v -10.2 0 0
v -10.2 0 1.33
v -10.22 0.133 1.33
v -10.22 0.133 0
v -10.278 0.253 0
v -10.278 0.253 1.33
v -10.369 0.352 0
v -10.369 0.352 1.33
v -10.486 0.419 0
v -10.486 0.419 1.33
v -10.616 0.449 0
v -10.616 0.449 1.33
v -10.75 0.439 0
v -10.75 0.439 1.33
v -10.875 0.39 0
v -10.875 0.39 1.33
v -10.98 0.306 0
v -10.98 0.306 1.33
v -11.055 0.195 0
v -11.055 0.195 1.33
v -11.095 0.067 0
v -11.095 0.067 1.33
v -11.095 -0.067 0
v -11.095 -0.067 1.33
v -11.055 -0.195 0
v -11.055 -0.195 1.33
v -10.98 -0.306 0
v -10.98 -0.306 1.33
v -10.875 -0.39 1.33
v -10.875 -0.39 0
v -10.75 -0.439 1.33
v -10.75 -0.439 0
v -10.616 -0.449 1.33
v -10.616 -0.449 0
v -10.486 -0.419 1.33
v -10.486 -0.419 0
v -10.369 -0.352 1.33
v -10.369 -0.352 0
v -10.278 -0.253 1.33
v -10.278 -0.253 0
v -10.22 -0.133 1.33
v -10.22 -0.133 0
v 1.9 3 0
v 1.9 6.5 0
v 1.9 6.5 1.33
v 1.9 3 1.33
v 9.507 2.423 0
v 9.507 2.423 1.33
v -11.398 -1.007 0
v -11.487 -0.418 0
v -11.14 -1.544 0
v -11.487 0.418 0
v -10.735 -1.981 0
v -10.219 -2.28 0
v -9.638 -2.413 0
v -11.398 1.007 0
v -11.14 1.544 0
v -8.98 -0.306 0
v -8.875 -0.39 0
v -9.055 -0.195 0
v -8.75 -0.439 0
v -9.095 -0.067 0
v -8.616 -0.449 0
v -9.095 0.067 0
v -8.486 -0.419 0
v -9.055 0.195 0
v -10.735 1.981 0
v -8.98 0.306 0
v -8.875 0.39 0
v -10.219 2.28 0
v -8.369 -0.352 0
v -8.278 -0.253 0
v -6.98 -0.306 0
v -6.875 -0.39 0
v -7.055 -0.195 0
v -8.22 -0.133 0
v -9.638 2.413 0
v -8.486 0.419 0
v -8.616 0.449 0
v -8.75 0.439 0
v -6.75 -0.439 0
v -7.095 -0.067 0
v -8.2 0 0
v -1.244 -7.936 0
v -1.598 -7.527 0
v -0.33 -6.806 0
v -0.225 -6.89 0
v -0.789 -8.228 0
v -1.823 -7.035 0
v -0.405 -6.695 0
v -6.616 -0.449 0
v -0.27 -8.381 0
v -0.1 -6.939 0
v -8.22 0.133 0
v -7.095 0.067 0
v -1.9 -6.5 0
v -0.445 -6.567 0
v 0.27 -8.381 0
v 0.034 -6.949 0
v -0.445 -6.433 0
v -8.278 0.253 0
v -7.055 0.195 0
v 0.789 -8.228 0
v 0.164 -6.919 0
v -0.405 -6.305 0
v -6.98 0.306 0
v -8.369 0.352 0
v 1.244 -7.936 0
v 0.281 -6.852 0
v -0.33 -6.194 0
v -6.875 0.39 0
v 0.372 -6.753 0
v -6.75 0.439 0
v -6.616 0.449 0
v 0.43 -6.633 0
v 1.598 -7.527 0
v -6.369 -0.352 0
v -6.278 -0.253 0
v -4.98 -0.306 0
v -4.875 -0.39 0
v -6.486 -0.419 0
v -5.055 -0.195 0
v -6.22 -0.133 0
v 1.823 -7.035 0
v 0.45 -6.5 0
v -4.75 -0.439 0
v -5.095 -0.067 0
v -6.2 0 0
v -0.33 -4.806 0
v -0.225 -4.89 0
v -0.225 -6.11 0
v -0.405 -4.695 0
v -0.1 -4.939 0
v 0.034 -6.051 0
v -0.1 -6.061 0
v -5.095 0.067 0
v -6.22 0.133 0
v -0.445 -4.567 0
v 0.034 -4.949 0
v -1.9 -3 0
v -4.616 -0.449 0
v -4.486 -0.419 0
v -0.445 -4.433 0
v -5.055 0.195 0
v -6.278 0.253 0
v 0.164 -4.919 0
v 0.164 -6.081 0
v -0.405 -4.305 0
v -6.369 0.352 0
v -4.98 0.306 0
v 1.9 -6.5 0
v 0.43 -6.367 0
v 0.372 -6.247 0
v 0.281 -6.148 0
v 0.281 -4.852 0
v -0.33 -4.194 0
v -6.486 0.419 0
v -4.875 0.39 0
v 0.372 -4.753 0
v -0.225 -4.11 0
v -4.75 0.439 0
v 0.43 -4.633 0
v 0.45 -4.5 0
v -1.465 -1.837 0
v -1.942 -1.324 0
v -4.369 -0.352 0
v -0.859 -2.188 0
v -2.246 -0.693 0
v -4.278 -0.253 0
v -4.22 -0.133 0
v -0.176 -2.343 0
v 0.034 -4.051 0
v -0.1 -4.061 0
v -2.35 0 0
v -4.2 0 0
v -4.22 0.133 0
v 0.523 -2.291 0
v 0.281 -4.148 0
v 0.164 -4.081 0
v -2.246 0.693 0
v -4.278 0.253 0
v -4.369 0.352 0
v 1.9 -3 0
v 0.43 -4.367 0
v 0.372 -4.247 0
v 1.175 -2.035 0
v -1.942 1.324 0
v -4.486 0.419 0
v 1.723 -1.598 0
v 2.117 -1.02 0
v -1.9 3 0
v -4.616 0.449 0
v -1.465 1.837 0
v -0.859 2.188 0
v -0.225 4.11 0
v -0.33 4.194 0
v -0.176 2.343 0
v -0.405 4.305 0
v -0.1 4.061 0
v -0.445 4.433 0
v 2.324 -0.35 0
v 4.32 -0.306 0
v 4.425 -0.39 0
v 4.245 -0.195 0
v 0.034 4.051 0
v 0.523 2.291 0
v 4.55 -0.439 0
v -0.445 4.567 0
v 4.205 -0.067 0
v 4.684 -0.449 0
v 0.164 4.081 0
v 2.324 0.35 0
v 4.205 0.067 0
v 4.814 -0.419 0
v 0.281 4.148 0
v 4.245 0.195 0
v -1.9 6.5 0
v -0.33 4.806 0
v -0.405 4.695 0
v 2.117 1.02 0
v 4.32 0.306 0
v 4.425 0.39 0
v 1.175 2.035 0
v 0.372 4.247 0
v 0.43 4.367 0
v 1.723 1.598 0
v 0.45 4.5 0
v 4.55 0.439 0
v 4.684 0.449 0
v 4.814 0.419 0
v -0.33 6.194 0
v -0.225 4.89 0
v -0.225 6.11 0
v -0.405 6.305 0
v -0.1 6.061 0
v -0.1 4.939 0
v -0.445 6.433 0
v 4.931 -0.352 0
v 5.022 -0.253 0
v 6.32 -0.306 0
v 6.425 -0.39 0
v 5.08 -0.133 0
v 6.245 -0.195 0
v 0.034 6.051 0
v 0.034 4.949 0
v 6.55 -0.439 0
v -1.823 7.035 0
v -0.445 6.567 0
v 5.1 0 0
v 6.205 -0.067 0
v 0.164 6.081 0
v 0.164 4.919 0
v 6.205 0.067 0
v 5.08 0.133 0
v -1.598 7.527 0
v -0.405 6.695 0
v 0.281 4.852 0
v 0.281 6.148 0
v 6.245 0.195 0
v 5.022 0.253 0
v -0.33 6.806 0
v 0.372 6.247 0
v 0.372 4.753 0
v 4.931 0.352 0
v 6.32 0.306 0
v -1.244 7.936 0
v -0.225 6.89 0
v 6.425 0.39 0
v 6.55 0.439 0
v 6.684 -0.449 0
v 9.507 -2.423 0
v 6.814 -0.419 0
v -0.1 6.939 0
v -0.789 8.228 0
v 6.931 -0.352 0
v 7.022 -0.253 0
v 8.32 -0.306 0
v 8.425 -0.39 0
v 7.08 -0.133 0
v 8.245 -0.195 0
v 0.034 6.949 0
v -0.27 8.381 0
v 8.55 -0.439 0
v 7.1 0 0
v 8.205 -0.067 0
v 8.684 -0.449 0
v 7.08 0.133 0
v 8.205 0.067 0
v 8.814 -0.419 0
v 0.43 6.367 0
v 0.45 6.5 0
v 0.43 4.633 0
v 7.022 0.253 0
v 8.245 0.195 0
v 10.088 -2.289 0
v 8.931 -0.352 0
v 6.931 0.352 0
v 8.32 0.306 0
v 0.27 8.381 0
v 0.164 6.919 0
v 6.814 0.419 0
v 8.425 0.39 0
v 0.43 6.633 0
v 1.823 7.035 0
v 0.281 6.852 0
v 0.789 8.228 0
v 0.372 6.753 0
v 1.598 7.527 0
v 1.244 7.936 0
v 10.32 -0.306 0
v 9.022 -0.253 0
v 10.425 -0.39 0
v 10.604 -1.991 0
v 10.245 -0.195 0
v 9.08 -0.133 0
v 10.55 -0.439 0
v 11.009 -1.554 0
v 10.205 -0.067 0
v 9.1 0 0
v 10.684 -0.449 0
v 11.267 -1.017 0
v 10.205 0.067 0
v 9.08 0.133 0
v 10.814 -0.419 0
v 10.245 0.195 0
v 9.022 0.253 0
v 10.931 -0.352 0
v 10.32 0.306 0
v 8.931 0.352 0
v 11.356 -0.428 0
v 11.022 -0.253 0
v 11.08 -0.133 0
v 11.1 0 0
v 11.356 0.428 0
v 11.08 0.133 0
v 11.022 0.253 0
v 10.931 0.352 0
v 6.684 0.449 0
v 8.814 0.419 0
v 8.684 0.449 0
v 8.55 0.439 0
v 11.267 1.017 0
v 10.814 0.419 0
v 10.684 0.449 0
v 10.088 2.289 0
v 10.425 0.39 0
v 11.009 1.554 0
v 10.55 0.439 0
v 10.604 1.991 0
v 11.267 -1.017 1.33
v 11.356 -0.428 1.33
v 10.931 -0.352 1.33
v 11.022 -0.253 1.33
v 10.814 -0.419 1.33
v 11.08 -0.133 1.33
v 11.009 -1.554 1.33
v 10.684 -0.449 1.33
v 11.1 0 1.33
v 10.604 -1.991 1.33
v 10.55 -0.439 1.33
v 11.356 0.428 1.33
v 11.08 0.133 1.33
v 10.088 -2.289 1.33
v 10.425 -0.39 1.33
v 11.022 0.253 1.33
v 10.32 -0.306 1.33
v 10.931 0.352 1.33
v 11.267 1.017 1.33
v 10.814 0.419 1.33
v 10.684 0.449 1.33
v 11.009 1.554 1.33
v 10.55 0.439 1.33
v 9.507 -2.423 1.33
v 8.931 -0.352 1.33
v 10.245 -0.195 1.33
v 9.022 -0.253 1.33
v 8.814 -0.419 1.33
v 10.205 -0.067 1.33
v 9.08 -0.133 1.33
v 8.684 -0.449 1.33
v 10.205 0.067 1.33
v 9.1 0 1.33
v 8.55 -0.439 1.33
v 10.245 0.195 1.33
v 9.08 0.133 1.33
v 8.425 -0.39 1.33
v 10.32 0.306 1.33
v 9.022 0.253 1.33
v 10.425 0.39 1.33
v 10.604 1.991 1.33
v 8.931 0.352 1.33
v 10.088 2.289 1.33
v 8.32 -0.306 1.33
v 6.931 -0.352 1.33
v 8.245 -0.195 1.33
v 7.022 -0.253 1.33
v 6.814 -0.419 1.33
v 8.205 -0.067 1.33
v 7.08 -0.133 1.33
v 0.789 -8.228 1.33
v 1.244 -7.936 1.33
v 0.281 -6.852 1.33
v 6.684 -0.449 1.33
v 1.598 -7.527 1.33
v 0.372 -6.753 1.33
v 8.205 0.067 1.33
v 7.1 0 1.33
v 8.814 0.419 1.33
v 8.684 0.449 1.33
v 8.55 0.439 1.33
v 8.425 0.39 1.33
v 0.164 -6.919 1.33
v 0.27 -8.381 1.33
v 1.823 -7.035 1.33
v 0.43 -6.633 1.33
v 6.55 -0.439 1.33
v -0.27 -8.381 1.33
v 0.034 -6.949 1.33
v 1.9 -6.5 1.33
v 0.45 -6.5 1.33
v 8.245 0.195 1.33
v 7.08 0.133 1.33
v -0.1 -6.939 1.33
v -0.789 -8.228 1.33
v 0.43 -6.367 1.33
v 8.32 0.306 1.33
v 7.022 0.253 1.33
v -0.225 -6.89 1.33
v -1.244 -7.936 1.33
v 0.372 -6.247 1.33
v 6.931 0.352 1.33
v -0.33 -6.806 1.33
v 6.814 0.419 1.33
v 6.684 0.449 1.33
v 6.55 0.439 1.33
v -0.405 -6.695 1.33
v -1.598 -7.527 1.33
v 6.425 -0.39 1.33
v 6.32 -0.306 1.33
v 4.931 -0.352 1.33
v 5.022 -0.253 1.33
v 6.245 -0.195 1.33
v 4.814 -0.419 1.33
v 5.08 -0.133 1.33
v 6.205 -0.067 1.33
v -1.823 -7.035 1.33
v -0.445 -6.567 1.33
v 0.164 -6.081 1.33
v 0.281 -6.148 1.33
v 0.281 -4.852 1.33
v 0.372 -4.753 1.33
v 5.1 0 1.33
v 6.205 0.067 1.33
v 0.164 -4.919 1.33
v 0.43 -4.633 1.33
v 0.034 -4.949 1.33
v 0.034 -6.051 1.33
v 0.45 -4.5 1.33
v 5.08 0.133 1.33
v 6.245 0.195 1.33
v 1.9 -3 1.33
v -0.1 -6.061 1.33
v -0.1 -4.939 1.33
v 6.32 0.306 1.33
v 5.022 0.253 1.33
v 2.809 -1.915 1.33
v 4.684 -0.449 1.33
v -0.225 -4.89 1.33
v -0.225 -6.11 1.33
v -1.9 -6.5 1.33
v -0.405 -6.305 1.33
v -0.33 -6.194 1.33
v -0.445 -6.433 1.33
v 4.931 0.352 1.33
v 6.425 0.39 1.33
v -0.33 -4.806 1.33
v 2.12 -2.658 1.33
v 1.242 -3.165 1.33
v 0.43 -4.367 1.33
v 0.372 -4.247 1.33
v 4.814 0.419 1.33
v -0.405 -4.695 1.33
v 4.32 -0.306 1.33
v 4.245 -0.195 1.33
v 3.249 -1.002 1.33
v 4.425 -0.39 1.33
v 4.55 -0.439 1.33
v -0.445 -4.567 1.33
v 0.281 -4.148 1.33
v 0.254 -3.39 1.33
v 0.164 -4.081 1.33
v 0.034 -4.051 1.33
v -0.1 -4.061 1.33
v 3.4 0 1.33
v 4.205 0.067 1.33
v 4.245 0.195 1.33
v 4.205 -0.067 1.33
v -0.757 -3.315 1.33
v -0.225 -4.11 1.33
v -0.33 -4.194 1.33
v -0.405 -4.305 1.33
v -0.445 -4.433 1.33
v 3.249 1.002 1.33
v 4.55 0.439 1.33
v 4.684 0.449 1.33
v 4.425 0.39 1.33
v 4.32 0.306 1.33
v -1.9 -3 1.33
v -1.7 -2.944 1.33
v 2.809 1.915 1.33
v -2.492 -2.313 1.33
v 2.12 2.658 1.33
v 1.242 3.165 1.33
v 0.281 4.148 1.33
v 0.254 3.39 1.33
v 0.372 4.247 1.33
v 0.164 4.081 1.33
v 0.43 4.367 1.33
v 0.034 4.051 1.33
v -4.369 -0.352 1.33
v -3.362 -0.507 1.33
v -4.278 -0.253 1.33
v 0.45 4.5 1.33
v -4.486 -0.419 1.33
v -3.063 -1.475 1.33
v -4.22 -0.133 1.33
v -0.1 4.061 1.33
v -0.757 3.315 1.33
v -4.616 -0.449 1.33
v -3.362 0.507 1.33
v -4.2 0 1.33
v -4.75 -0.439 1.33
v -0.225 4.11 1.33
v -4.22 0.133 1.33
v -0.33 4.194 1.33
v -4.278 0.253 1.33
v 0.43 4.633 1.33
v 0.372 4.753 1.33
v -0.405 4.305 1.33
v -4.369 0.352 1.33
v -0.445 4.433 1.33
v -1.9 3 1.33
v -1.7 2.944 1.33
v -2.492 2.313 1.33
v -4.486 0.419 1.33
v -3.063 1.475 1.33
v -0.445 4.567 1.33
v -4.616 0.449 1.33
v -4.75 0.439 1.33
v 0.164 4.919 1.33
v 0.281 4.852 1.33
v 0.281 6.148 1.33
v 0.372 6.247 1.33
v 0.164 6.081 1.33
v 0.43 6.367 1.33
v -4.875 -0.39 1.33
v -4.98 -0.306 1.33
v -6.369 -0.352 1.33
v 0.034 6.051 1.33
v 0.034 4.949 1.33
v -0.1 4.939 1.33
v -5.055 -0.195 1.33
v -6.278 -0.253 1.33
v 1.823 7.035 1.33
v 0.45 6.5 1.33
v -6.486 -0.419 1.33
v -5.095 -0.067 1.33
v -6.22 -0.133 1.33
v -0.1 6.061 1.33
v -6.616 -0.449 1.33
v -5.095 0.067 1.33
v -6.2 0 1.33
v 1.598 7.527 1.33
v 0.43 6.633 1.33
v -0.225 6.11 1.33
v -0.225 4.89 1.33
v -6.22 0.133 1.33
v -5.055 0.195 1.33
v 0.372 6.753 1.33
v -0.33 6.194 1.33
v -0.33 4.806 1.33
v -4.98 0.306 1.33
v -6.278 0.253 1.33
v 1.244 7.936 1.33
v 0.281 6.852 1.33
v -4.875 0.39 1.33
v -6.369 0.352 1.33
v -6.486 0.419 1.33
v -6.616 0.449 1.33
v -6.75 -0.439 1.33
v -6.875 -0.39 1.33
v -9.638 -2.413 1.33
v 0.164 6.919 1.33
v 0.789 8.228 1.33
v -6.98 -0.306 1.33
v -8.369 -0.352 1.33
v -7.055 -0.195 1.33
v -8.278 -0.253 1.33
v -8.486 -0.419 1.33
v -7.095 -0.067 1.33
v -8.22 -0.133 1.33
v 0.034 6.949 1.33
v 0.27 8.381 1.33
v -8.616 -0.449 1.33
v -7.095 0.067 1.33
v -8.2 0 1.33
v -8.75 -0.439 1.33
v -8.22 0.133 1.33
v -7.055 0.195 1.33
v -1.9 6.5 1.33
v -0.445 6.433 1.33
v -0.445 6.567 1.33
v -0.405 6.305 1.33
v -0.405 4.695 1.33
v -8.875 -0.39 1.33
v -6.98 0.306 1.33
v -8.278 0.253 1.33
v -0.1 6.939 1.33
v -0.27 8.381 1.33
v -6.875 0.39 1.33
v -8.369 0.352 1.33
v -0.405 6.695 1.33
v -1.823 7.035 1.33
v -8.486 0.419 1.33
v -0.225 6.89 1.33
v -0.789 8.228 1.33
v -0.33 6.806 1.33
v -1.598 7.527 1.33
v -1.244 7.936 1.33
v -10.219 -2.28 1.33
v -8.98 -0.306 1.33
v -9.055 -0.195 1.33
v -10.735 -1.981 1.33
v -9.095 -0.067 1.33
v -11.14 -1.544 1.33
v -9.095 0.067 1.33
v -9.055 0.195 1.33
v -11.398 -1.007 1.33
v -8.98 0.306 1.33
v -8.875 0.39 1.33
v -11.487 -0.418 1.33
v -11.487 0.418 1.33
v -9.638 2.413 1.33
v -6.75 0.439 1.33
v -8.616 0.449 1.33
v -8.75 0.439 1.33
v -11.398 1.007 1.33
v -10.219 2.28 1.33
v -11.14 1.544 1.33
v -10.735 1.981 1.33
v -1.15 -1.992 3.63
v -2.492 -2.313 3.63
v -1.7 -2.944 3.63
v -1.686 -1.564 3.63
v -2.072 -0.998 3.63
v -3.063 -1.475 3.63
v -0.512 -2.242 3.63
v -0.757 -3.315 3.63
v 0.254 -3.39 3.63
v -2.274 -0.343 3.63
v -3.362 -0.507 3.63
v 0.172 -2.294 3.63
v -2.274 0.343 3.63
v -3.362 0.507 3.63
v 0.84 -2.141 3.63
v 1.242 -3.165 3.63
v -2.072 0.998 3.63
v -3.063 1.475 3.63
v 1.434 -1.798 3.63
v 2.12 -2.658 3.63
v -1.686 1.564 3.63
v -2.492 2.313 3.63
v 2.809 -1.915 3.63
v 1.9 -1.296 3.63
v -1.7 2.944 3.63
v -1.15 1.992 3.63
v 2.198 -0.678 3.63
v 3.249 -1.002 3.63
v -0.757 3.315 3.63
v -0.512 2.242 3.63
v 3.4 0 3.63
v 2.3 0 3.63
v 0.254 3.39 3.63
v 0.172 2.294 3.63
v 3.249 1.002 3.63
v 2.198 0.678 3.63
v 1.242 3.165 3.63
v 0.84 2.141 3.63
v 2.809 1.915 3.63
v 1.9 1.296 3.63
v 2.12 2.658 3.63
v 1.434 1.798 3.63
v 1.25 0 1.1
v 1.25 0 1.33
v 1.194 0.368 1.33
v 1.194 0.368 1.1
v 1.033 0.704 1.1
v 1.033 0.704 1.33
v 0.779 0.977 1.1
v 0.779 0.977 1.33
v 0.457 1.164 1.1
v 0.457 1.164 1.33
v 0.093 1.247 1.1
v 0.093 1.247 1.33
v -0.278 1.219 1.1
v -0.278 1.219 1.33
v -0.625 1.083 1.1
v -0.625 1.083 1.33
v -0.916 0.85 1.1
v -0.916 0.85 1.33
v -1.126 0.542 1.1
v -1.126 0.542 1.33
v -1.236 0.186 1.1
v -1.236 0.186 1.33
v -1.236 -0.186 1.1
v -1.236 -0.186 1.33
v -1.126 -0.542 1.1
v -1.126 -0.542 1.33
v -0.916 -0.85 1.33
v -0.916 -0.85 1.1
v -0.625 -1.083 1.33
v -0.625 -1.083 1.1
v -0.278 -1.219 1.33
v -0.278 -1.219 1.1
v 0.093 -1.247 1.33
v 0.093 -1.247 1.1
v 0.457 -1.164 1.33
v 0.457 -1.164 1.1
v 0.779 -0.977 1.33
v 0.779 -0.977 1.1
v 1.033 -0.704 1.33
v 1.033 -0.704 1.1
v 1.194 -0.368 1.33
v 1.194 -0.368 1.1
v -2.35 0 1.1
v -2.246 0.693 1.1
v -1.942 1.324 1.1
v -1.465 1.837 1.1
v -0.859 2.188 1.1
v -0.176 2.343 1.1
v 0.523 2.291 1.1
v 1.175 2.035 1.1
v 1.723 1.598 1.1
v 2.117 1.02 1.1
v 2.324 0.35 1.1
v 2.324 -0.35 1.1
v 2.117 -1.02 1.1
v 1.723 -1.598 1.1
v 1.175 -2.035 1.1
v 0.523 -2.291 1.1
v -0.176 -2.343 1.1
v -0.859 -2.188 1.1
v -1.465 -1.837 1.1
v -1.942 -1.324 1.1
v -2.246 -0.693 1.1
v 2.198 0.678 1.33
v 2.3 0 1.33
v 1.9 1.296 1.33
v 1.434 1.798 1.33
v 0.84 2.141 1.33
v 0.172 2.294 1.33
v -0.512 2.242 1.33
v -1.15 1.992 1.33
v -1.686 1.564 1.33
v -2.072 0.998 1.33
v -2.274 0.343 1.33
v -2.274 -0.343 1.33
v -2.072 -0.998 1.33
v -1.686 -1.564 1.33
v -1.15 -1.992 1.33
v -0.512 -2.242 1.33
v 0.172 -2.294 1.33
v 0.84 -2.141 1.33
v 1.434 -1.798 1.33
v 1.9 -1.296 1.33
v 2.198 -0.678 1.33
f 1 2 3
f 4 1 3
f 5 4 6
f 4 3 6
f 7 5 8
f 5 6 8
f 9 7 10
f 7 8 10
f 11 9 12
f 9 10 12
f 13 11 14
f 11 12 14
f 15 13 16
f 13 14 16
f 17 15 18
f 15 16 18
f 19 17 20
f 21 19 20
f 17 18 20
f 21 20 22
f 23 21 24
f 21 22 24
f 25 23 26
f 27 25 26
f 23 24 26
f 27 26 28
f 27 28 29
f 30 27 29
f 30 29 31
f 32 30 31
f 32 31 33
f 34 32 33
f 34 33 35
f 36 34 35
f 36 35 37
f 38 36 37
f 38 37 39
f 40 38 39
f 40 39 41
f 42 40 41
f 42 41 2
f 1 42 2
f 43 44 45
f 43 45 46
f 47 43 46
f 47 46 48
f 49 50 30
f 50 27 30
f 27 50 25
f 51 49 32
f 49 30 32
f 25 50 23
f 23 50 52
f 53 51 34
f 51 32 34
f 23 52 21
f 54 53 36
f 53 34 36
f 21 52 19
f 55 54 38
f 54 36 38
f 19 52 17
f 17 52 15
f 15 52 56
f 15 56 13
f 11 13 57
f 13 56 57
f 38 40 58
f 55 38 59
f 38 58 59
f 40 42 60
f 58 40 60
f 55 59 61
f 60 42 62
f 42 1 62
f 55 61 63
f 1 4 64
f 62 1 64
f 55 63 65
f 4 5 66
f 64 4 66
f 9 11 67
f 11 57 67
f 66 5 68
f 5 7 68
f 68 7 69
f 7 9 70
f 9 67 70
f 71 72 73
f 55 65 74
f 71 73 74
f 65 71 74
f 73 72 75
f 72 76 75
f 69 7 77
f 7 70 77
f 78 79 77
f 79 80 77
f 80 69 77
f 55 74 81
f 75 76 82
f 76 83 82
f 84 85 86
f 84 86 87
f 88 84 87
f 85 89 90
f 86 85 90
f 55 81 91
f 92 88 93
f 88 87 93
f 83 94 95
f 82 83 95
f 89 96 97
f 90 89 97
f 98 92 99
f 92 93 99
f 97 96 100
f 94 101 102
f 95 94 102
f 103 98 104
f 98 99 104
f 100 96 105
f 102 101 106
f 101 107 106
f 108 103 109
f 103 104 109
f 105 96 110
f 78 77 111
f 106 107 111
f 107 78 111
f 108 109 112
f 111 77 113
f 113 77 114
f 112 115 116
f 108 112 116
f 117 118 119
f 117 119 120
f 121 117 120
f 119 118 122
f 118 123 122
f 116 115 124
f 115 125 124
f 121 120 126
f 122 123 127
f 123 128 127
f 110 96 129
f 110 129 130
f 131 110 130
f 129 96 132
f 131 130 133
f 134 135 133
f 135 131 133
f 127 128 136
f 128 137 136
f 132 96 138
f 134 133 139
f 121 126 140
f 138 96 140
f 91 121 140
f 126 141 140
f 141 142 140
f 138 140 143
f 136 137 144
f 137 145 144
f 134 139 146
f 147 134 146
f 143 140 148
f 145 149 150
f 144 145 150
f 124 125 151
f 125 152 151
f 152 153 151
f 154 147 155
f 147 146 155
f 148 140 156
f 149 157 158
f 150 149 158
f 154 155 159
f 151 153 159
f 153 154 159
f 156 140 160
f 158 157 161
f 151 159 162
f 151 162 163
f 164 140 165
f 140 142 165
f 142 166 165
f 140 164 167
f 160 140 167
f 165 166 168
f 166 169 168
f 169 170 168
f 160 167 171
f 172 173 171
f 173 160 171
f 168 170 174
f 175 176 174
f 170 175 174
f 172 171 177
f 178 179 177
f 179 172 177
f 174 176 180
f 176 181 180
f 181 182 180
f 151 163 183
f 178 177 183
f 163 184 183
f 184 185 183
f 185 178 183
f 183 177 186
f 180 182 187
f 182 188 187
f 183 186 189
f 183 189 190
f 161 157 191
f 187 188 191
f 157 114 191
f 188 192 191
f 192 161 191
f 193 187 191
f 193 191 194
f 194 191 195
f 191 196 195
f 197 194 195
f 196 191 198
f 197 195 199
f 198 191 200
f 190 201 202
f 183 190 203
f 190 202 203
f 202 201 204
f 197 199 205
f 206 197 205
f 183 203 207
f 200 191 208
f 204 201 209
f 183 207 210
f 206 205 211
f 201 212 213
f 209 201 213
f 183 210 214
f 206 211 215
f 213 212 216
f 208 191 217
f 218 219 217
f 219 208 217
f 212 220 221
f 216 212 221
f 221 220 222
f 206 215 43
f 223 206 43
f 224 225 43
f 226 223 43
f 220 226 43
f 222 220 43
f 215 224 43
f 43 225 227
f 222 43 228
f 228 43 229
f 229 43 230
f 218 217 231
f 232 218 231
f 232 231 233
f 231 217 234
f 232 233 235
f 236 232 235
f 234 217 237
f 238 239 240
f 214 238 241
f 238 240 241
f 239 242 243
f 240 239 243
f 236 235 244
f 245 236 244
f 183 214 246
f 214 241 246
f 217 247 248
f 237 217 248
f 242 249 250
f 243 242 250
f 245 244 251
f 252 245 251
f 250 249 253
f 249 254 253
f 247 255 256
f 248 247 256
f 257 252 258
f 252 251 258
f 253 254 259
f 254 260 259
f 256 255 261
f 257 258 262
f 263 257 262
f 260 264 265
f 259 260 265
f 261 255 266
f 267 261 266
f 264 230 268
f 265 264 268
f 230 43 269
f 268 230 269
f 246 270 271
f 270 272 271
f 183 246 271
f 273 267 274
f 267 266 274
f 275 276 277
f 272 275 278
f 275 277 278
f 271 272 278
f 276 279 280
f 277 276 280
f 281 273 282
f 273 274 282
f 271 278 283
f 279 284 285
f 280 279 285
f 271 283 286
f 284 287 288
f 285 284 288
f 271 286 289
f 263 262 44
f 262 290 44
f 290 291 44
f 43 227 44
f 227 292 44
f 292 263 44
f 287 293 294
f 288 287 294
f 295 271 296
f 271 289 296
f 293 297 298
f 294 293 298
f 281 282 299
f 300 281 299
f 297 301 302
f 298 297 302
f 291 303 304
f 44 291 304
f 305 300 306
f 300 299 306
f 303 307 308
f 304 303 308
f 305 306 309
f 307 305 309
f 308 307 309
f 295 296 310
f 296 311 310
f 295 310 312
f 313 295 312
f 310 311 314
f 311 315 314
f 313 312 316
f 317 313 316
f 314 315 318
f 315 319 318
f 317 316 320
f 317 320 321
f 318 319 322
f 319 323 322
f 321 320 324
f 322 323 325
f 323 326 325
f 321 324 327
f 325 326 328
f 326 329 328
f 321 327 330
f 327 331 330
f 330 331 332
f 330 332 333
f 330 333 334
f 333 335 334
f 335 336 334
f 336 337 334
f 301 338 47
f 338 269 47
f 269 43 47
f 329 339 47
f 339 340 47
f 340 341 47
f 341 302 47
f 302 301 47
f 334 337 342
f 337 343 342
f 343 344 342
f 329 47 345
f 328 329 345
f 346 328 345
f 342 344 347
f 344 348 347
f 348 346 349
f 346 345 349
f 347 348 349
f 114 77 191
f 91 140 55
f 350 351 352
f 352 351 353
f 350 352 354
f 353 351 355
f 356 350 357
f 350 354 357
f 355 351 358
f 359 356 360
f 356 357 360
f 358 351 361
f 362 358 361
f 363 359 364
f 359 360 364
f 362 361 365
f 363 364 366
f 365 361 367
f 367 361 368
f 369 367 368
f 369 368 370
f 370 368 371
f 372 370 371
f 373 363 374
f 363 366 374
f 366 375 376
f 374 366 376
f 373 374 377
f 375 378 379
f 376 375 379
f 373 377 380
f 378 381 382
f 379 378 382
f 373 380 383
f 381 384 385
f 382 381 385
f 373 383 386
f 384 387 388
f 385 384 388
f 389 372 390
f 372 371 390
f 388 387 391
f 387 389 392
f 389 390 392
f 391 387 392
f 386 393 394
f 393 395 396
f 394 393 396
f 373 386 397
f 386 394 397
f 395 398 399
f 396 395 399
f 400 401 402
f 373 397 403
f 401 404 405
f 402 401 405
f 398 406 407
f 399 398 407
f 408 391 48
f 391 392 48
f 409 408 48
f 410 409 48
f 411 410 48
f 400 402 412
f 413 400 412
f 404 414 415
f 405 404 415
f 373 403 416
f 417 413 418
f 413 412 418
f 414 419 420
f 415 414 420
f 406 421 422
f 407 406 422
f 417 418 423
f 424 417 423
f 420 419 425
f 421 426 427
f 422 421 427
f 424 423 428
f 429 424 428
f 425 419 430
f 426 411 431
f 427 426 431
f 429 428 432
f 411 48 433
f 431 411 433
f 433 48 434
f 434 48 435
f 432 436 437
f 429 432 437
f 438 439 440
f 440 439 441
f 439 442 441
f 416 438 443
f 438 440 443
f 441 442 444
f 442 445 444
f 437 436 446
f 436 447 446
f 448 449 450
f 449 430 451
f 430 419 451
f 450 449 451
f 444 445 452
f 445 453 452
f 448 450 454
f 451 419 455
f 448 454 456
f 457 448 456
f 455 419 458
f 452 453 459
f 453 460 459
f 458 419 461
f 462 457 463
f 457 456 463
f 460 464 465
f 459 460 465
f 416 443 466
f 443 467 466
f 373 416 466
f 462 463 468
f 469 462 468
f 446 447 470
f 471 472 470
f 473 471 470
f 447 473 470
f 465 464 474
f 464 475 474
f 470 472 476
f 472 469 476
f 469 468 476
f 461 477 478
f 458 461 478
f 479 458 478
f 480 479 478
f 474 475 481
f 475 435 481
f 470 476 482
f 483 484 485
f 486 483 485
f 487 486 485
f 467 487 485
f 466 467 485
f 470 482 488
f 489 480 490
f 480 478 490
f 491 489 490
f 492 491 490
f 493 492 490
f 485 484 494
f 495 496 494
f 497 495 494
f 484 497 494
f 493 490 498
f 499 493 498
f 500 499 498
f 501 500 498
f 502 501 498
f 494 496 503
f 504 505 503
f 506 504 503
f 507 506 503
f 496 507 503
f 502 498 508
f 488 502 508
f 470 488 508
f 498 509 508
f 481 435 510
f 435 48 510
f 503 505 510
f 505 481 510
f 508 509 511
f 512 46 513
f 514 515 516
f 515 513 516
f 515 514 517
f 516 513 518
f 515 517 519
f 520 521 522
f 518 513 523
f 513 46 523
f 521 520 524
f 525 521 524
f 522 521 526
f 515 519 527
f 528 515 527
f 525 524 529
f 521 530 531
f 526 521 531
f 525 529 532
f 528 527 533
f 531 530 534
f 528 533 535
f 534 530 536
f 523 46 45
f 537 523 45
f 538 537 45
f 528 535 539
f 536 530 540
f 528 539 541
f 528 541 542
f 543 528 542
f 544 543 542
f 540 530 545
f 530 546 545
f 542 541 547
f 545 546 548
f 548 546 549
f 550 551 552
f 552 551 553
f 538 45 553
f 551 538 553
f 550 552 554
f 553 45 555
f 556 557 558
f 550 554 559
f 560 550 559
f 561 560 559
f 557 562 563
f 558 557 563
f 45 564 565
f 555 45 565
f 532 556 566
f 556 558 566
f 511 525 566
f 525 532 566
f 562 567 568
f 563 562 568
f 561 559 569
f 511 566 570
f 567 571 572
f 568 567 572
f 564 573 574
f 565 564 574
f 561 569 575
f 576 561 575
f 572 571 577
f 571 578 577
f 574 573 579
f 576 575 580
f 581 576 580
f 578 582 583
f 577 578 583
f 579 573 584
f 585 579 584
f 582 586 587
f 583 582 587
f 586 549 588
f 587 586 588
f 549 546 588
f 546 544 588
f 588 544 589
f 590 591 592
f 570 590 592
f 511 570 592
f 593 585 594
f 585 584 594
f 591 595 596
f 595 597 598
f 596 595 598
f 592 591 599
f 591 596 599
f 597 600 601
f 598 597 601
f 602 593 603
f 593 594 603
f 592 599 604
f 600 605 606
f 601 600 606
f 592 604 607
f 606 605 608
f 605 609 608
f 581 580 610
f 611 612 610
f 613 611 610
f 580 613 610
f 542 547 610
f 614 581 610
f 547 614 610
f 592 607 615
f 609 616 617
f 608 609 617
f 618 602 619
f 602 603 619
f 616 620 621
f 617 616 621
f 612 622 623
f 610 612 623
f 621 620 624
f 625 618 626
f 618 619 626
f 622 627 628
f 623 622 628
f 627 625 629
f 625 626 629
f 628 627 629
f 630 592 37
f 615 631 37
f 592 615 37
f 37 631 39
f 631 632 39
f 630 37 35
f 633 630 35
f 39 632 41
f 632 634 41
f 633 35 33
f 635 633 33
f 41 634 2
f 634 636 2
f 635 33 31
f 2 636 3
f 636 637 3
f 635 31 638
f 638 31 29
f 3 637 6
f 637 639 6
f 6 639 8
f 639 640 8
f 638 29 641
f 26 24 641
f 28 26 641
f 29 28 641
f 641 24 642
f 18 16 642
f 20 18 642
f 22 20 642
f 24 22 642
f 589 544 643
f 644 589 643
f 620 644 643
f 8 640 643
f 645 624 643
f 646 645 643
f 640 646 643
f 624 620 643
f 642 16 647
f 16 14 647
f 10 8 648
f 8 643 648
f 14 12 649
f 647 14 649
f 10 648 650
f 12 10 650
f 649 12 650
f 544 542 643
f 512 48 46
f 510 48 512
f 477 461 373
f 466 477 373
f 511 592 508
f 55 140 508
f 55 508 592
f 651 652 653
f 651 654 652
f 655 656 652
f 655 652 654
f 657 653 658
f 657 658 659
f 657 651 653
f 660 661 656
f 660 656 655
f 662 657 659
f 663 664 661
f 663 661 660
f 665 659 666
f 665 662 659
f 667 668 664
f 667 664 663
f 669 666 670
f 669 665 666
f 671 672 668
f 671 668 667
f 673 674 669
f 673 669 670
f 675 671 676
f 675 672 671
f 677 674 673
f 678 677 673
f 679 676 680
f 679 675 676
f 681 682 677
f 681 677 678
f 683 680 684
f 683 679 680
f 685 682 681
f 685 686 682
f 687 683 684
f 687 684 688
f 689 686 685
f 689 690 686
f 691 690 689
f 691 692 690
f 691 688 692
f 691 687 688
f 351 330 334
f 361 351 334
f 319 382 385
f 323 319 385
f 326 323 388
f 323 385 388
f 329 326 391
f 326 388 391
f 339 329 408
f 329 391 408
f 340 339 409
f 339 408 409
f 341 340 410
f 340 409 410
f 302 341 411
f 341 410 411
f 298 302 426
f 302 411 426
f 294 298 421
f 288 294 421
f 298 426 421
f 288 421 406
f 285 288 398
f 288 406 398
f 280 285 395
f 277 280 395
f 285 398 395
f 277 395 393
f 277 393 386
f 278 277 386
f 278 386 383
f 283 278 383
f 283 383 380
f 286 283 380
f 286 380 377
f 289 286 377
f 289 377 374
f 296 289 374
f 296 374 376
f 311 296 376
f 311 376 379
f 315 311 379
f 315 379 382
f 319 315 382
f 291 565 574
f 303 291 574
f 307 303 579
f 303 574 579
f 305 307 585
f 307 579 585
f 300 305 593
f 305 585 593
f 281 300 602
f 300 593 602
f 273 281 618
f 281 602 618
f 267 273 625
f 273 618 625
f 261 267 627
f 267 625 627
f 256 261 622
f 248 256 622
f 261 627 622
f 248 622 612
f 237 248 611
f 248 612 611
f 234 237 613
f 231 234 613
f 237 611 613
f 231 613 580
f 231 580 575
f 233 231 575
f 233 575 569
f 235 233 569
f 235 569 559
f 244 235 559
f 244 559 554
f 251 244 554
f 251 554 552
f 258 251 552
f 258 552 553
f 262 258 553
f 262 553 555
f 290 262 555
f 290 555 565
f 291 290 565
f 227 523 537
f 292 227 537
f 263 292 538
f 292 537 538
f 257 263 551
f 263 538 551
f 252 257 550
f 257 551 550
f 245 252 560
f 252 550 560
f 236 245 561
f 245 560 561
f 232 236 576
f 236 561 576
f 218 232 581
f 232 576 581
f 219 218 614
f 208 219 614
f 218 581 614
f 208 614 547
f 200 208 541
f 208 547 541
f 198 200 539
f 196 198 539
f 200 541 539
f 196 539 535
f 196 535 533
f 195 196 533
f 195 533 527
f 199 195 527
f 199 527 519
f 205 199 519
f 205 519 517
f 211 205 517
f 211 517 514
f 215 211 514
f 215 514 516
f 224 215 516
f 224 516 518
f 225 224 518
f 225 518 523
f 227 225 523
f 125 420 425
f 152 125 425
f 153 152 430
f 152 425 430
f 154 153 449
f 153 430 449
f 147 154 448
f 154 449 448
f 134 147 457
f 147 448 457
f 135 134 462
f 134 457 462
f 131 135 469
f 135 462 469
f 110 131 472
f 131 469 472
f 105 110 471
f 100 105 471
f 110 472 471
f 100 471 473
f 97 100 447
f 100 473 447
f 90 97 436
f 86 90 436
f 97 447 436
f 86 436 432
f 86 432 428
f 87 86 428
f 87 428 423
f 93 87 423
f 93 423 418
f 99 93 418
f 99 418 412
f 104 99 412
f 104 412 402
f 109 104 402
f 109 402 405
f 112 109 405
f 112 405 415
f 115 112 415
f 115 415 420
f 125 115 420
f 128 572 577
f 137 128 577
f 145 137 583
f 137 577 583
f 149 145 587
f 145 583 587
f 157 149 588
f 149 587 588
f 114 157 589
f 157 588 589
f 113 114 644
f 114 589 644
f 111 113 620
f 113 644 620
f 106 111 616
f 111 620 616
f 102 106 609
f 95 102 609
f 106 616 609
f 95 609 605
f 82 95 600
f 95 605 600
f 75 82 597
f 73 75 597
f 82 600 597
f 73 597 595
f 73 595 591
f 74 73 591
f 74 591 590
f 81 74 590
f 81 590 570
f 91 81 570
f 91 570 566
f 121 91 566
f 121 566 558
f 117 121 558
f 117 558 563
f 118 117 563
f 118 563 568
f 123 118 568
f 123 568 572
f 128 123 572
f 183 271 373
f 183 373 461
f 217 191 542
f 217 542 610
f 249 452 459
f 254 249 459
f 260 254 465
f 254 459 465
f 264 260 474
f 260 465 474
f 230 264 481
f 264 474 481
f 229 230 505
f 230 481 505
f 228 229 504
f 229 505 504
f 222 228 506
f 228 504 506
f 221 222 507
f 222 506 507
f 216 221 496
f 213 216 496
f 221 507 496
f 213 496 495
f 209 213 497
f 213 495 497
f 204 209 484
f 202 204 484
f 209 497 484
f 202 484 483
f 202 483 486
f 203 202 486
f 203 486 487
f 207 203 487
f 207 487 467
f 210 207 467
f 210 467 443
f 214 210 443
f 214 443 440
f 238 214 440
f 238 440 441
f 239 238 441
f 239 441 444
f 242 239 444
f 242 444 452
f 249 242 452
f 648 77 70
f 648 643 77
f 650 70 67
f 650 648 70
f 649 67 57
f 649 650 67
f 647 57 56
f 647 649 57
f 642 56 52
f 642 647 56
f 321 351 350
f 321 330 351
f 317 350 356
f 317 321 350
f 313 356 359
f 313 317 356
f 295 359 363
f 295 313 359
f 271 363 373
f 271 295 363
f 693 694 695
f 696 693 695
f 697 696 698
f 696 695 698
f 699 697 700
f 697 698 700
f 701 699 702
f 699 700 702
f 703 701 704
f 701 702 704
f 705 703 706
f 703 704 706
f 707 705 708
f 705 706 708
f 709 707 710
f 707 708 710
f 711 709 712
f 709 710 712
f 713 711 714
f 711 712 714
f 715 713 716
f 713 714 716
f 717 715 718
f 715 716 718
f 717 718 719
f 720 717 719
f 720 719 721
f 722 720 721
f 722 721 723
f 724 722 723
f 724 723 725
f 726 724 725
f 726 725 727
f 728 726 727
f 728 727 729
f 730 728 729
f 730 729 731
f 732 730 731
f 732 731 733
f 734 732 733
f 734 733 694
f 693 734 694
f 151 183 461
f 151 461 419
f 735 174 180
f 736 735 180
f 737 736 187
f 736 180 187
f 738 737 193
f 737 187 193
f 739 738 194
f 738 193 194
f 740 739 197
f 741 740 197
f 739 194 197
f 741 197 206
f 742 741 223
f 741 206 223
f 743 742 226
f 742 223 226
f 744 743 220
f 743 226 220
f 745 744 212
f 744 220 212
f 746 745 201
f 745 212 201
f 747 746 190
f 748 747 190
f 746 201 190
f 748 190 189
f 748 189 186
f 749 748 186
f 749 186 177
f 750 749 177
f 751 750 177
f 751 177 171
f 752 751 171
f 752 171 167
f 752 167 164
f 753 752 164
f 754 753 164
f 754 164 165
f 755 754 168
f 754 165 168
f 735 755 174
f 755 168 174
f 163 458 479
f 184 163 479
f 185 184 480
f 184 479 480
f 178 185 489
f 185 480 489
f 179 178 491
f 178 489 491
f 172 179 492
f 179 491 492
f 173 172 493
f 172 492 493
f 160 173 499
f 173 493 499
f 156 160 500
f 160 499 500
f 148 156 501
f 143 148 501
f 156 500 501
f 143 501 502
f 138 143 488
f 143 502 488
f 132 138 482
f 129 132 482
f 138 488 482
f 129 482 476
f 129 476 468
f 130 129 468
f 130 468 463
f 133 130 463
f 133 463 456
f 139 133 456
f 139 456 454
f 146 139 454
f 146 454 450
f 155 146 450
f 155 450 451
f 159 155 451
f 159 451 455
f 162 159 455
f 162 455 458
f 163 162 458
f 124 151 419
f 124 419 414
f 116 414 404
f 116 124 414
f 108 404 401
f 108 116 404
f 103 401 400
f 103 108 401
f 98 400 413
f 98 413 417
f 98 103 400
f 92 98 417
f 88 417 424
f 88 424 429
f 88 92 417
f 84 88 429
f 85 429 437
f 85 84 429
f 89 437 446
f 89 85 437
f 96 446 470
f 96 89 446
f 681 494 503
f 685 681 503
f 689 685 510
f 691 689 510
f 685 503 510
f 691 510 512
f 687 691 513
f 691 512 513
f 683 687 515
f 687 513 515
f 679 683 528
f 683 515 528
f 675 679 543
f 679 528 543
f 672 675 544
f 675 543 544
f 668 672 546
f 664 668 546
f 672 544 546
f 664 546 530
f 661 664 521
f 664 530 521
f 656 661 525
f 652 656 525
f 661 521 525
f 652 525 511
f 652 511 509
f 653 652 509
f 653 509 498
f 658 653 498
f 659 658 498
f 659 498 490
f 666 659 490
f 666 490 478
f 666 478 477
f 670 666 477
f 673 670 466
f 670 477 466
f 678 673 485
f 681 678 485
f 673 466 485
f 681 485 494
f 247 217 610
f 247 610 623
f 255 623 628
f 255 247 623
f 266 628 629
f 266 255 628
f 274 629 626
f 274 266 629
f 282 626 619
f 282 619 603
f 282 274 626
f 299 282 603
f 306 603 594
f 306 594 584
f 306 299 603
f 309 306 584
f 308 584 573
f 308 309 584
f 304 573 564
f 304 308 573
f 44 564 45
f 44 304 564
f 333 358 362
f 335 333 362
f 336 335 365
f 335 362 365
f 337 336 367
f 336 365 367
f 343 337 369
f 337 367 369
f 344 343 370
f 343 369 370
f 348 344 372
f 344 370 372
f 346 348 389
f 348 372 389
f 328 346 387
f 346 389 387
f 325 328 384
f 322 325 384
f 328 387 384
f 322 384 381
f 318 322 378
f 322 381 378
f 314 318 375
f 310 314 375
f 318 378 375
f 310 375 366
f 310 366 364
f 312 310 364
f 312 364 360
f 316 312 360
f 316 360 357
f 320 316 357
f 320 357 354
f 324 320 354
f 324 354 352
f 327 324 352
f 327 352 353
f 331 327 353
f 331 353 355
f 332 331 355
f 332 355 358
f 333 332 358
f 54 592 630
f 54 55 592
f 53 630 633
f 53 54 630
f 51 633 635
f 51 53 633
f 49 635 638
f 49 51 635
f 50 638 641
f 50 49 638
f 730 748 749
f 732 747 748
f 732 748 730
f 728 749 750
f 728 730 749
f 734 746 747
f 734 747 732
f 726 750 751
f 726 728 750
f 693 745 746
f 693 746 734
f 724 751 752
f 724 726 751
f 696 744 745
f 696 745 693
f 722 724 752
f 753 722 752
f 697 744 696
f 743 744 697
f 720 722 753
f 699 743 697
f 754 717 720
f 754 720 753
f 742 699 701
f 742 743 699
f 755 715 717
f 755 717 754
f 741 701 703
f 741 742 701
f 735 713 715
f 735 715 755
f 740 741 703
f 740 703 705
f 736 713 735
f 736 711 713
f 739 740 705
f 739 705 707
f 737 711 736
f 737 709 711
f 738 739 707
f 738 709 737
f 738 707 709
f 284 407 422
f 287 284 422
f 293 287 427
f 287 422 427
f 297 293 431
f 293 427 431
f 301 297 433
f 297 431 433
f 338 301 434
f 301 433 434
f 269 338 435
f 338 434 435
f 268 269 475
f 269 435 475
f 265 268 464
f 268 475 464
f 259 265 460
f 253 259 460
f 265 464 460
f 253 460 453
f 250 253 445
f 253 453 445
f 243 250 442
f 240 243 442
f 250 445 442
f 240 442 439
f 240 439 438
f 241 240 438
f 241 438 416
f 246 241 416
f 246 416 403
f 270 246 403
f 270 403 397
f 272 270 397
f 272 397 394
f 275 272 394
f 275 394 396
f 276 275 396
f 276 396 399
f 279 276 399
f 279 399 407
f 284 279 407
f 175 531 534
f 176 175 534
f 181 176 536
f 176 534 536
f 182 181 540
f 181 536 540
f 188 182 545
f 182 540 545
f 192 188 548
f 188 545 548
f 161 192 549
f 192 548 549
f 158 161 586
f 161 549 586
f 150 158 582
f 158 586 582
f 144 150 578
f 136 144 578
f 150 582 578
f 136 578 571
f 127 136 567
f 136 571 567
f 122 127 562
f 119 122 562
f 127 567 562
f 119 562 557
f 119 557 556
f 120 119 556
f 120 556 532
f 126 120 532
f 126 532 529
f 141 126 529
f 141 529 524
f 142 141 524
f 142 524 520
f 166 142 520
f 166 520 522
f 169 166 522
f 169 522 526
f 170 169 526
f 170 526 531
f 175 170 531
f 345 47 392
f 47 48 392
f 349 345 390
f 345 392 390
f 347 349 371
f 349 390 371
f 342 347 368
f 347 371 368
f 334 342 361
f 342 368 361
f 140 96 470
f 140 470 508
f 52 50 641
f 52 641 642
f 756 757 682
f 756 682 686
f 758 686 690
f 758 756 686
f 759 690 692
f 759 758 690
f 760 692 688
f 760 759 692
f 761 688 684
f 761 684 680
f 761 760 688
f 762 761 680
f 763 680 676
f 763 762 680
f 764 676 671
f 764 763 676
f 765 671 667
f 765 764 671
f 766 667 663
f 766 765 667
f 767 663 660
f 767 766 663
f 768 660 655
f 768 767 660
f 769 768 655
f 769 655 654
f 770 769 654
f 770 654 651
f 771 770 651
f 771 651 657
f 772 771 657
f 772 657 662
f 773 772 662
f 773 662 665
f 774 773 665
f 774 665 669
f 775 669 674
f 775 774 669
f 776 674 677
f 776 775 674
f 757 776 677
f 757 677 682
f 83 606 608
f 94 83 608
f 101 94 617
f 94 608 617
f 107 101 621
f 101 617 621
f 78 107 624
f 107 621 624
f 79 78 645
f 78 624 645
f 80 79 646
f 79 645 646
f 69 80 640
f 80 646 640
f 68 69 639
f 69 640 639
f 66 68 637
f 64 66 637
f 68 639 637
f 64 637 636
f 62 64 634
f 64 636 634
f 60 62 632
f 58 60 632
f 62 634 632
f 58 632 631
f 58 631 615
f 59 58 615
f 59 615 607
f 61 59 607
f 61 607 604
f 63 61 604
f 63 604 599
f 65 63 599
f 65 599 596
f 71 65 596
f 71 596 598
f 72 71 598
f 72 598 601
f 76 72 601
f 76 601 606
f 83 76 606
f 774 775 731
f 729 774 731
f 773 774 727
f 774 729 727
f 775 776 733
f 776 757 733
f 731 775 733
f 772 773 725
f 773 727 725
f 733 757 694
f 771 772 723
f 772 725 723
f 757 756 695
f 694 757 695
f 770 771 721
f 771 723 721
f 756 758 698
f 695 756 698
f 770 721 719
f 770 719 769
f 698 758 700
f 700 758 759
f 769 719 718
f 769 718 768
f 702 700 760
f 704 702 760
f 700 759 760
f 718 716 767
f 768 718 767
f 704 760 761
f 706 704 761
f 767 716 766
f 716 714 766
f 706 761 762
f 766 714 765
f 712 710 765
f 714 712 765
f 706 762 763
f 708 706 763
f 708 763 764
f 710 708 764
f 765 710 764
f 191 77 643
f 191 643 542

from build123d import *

# Parameters (mm, degrees)
AUFSATZ_LINEAR_AUSTRAGEN1_DEPTH      = 1.33
SKIZZE2_R                            = 3.4
SKIZZE2_R_2                          = 2.3
AUFSATZ_LINEAR_AUSTRAGEN2_DEPTH      = 2.3
AUFSATZ_LINEAR_AUSTRAGEN2_DEPTH_BACK = 1.33
SKIZZE3_R                            = 1.25
SCHNITT_LINEAR_AUSTRAGEN1_DEPTH      = 2.33
SKIZZE4_R                            = 2.35
SCHNITT_LINEAR_AUSTRAGEN2_DEPTH      = 1.1
SKIZZE5_R                            = 0.45
SCHNITT_LINEAR_AUSTRAGEN3_DEPTH      = 2.33
SKIZZE7_W                            = 8.843573308
SKIZZE7_H                            = 7.939116947
SKIZZE7_W_2                          = 8.543023068
SKIZZE7_H_2                          = 6.617341639
SCHNITT_LINEAR_AUSTRAGEN4_DEPTH      = 1.33
VERRUNDUNG1_R                        = 2


with BuildPart() as part:
    # Skizze1 → Aufsatz-Linear austragen1 (new body)
    with BuildSketch(Plane.XY):
        with BuildLine():
            Line((-16.79191458, 1.869621687), (-1.9, 3))
            Line((-1.9, 3), (-1.9, 6.5))
            ThreePointArc((-1.9, 6.5), (0, 8.4), (1.9, 6.5))
            Line((1.9, 6.5), (1.9, 3))
            Line((1.9, 3), (16.79191458, 1.869621687))
            ThreePointArc((16.79191458, 1.869621687), (18.525, 0), (16.79191458, -1.869621687))
            Line((16.79191458, -1.869621687), (1.9, -3))
            Line((1.9, -3), (1.9, -6.5))
            ThreePointArc((1.9, -6.5), (0, -8.4), (-1.9, -6.5))
            Line((-1.9, -6.5), (-1.9, -3))
            Line((-1.9, -3), (-16.79191458, -1.869621687))
            ThreePointArc((-16.79191458, -1.869621687), (-18.525, 0), (-16.79191458, 1.869621687))
        make_face()
    extrude(amount=AUFSATZ_LINEAR_AUSTRAGEN1_DEPTH)

    # Skizze2 → Aufsatz-Linear austragen2 (add, two sides)
    with BuildSketch(Plane.XY.offset(1.33)) as aufsatz_linear_austragen2_sk:
        Circle(SKIZZE2_R)
        Circle(SKIZZE2_R_2, mode=Mode.SUBTRACT)
    extrude(amount=AUFSATZ_LINEAR_AUSTRAGEN2_DEPTH)
    extrude(aufsatz_linear_austragen2_sk.sketch, amount=-AUFSATZ_LINEAR_AUSTRAGEN2_DEPTH_BACK)

    # Skizze3 → Schnitt-Linear austragen1 (cut, through all)
    with BuildSketch(Plane.XY.offset(1.33)):
        Circle(SKIZZE3_R)
    extrude(amount=-SCHNITT_LINEAR_AUSTRAGEN1_DEPTH, mode=Mode.SUBTRACT)

    # Skizze4 → Schnitt-Linear austragen2 (cut)
    with BuildSketch(Plane(origin=(0, 0, 0), x_dir=(-1, 0, 0), z_dir=(0, 0, -1))):
        Circle(SKIZZE4_R)
    extrude(amount=-SCHNITT_LINEAR_AUSTRAGEN2_DEPTH, mode=Mode.SUBTRACT)

    # Skizze5 → Schnitt-Linear austragen3 (cut, through all)
    with BuildSketch(Plane.XY.offset(1.33)):
        with Locations((0, 6.5)):
            Circle(SKIZZE5_R)
        with Locations((-16.65, 0)):
            Circle(SKIZZE5_R)
        with Locations((0, 4.5)):
            Circle(SKIZZE5_R)
        with Locations((-14.65, 0)):
            Circle(SKIZZE5_R)
        with Locations((-12.65, 0)):
            Circle(SKIZZE5_R)
        with Locations((-10.65, 0)):
            Circle(SKIZZE5_R)
        with Locations((-8.65, 0)):
            Circle(SKIZZE5_R)
        with Locations((-6.65, 0)):
            Circle(SKIZZE5_R)
        with Locations((-4.65, 0)):
            Circle(SKIZZE5_R)
        with Locations((0, -4.5)):
            Circle(SKIZZE5_R)
        with Locations((0, -6.5)):
            Circle(SKIZZE5_R)
        with Locations((4.65, 0)):
            Circle(SKIZZE5_R)
        with Locations((6.65, 0)):
            Circle(SKIZZE5_R)
        with Locations((8.65, 0)):
            Circle(SKIZZE5_R)
        with Locations((10.65, 0)):
            Circle(SKIZZE5_R)
        with Locations((12.65, 0)):
            Circle(SKIZZE5_R)
        with Locations((14.65, 0)):
            Circle(SKIZZE5_R)
        with Locations((16.65, 0)):
            Circle(SKIZZE5_R)
    extrude(amount=-SCHNITT_LINEAR_AUSTRAGEN3_DEPTH, mode=Mode.SUBTRACT)

    # Skizze7 → Schnitt-Linear austragen4 (cut)
    with BuildSketch(Plane(origin=(0, 0, 0), x_dir=(-1, 0, 0), z_dir=(0, 0, -1))):
        with Locations((-15.777738742, 0.234488686)):
            Rectangle(SKIZZE7_W, SKIZZE7_H)
        with Locations((15.758609631, 0.140049559)):
            Rectangle(SKIZZE7_W_2, SKIZZE7_H_2)
    extrude(amount=-SCHNITT_LINEAR_AUSTRAGEN4_DEPTH, mode=Mode.SUBTRACT)

    # Verrundung1
    verrundung1_edges = [part.edges().sort_by_distance(p)[0] for p in [
        (11.355952088, -2.282241171, 0.665),
        (11.355952088, 2.282241171, 0.665),
        (-11.487098097, -2.272286467, 0.665),
        (-11.487098097, 2.272286467, 0.665),
    ]]
    fillet(verrundung1_edges, radius=VERRUNDUNG1_R)


solid = part.part
